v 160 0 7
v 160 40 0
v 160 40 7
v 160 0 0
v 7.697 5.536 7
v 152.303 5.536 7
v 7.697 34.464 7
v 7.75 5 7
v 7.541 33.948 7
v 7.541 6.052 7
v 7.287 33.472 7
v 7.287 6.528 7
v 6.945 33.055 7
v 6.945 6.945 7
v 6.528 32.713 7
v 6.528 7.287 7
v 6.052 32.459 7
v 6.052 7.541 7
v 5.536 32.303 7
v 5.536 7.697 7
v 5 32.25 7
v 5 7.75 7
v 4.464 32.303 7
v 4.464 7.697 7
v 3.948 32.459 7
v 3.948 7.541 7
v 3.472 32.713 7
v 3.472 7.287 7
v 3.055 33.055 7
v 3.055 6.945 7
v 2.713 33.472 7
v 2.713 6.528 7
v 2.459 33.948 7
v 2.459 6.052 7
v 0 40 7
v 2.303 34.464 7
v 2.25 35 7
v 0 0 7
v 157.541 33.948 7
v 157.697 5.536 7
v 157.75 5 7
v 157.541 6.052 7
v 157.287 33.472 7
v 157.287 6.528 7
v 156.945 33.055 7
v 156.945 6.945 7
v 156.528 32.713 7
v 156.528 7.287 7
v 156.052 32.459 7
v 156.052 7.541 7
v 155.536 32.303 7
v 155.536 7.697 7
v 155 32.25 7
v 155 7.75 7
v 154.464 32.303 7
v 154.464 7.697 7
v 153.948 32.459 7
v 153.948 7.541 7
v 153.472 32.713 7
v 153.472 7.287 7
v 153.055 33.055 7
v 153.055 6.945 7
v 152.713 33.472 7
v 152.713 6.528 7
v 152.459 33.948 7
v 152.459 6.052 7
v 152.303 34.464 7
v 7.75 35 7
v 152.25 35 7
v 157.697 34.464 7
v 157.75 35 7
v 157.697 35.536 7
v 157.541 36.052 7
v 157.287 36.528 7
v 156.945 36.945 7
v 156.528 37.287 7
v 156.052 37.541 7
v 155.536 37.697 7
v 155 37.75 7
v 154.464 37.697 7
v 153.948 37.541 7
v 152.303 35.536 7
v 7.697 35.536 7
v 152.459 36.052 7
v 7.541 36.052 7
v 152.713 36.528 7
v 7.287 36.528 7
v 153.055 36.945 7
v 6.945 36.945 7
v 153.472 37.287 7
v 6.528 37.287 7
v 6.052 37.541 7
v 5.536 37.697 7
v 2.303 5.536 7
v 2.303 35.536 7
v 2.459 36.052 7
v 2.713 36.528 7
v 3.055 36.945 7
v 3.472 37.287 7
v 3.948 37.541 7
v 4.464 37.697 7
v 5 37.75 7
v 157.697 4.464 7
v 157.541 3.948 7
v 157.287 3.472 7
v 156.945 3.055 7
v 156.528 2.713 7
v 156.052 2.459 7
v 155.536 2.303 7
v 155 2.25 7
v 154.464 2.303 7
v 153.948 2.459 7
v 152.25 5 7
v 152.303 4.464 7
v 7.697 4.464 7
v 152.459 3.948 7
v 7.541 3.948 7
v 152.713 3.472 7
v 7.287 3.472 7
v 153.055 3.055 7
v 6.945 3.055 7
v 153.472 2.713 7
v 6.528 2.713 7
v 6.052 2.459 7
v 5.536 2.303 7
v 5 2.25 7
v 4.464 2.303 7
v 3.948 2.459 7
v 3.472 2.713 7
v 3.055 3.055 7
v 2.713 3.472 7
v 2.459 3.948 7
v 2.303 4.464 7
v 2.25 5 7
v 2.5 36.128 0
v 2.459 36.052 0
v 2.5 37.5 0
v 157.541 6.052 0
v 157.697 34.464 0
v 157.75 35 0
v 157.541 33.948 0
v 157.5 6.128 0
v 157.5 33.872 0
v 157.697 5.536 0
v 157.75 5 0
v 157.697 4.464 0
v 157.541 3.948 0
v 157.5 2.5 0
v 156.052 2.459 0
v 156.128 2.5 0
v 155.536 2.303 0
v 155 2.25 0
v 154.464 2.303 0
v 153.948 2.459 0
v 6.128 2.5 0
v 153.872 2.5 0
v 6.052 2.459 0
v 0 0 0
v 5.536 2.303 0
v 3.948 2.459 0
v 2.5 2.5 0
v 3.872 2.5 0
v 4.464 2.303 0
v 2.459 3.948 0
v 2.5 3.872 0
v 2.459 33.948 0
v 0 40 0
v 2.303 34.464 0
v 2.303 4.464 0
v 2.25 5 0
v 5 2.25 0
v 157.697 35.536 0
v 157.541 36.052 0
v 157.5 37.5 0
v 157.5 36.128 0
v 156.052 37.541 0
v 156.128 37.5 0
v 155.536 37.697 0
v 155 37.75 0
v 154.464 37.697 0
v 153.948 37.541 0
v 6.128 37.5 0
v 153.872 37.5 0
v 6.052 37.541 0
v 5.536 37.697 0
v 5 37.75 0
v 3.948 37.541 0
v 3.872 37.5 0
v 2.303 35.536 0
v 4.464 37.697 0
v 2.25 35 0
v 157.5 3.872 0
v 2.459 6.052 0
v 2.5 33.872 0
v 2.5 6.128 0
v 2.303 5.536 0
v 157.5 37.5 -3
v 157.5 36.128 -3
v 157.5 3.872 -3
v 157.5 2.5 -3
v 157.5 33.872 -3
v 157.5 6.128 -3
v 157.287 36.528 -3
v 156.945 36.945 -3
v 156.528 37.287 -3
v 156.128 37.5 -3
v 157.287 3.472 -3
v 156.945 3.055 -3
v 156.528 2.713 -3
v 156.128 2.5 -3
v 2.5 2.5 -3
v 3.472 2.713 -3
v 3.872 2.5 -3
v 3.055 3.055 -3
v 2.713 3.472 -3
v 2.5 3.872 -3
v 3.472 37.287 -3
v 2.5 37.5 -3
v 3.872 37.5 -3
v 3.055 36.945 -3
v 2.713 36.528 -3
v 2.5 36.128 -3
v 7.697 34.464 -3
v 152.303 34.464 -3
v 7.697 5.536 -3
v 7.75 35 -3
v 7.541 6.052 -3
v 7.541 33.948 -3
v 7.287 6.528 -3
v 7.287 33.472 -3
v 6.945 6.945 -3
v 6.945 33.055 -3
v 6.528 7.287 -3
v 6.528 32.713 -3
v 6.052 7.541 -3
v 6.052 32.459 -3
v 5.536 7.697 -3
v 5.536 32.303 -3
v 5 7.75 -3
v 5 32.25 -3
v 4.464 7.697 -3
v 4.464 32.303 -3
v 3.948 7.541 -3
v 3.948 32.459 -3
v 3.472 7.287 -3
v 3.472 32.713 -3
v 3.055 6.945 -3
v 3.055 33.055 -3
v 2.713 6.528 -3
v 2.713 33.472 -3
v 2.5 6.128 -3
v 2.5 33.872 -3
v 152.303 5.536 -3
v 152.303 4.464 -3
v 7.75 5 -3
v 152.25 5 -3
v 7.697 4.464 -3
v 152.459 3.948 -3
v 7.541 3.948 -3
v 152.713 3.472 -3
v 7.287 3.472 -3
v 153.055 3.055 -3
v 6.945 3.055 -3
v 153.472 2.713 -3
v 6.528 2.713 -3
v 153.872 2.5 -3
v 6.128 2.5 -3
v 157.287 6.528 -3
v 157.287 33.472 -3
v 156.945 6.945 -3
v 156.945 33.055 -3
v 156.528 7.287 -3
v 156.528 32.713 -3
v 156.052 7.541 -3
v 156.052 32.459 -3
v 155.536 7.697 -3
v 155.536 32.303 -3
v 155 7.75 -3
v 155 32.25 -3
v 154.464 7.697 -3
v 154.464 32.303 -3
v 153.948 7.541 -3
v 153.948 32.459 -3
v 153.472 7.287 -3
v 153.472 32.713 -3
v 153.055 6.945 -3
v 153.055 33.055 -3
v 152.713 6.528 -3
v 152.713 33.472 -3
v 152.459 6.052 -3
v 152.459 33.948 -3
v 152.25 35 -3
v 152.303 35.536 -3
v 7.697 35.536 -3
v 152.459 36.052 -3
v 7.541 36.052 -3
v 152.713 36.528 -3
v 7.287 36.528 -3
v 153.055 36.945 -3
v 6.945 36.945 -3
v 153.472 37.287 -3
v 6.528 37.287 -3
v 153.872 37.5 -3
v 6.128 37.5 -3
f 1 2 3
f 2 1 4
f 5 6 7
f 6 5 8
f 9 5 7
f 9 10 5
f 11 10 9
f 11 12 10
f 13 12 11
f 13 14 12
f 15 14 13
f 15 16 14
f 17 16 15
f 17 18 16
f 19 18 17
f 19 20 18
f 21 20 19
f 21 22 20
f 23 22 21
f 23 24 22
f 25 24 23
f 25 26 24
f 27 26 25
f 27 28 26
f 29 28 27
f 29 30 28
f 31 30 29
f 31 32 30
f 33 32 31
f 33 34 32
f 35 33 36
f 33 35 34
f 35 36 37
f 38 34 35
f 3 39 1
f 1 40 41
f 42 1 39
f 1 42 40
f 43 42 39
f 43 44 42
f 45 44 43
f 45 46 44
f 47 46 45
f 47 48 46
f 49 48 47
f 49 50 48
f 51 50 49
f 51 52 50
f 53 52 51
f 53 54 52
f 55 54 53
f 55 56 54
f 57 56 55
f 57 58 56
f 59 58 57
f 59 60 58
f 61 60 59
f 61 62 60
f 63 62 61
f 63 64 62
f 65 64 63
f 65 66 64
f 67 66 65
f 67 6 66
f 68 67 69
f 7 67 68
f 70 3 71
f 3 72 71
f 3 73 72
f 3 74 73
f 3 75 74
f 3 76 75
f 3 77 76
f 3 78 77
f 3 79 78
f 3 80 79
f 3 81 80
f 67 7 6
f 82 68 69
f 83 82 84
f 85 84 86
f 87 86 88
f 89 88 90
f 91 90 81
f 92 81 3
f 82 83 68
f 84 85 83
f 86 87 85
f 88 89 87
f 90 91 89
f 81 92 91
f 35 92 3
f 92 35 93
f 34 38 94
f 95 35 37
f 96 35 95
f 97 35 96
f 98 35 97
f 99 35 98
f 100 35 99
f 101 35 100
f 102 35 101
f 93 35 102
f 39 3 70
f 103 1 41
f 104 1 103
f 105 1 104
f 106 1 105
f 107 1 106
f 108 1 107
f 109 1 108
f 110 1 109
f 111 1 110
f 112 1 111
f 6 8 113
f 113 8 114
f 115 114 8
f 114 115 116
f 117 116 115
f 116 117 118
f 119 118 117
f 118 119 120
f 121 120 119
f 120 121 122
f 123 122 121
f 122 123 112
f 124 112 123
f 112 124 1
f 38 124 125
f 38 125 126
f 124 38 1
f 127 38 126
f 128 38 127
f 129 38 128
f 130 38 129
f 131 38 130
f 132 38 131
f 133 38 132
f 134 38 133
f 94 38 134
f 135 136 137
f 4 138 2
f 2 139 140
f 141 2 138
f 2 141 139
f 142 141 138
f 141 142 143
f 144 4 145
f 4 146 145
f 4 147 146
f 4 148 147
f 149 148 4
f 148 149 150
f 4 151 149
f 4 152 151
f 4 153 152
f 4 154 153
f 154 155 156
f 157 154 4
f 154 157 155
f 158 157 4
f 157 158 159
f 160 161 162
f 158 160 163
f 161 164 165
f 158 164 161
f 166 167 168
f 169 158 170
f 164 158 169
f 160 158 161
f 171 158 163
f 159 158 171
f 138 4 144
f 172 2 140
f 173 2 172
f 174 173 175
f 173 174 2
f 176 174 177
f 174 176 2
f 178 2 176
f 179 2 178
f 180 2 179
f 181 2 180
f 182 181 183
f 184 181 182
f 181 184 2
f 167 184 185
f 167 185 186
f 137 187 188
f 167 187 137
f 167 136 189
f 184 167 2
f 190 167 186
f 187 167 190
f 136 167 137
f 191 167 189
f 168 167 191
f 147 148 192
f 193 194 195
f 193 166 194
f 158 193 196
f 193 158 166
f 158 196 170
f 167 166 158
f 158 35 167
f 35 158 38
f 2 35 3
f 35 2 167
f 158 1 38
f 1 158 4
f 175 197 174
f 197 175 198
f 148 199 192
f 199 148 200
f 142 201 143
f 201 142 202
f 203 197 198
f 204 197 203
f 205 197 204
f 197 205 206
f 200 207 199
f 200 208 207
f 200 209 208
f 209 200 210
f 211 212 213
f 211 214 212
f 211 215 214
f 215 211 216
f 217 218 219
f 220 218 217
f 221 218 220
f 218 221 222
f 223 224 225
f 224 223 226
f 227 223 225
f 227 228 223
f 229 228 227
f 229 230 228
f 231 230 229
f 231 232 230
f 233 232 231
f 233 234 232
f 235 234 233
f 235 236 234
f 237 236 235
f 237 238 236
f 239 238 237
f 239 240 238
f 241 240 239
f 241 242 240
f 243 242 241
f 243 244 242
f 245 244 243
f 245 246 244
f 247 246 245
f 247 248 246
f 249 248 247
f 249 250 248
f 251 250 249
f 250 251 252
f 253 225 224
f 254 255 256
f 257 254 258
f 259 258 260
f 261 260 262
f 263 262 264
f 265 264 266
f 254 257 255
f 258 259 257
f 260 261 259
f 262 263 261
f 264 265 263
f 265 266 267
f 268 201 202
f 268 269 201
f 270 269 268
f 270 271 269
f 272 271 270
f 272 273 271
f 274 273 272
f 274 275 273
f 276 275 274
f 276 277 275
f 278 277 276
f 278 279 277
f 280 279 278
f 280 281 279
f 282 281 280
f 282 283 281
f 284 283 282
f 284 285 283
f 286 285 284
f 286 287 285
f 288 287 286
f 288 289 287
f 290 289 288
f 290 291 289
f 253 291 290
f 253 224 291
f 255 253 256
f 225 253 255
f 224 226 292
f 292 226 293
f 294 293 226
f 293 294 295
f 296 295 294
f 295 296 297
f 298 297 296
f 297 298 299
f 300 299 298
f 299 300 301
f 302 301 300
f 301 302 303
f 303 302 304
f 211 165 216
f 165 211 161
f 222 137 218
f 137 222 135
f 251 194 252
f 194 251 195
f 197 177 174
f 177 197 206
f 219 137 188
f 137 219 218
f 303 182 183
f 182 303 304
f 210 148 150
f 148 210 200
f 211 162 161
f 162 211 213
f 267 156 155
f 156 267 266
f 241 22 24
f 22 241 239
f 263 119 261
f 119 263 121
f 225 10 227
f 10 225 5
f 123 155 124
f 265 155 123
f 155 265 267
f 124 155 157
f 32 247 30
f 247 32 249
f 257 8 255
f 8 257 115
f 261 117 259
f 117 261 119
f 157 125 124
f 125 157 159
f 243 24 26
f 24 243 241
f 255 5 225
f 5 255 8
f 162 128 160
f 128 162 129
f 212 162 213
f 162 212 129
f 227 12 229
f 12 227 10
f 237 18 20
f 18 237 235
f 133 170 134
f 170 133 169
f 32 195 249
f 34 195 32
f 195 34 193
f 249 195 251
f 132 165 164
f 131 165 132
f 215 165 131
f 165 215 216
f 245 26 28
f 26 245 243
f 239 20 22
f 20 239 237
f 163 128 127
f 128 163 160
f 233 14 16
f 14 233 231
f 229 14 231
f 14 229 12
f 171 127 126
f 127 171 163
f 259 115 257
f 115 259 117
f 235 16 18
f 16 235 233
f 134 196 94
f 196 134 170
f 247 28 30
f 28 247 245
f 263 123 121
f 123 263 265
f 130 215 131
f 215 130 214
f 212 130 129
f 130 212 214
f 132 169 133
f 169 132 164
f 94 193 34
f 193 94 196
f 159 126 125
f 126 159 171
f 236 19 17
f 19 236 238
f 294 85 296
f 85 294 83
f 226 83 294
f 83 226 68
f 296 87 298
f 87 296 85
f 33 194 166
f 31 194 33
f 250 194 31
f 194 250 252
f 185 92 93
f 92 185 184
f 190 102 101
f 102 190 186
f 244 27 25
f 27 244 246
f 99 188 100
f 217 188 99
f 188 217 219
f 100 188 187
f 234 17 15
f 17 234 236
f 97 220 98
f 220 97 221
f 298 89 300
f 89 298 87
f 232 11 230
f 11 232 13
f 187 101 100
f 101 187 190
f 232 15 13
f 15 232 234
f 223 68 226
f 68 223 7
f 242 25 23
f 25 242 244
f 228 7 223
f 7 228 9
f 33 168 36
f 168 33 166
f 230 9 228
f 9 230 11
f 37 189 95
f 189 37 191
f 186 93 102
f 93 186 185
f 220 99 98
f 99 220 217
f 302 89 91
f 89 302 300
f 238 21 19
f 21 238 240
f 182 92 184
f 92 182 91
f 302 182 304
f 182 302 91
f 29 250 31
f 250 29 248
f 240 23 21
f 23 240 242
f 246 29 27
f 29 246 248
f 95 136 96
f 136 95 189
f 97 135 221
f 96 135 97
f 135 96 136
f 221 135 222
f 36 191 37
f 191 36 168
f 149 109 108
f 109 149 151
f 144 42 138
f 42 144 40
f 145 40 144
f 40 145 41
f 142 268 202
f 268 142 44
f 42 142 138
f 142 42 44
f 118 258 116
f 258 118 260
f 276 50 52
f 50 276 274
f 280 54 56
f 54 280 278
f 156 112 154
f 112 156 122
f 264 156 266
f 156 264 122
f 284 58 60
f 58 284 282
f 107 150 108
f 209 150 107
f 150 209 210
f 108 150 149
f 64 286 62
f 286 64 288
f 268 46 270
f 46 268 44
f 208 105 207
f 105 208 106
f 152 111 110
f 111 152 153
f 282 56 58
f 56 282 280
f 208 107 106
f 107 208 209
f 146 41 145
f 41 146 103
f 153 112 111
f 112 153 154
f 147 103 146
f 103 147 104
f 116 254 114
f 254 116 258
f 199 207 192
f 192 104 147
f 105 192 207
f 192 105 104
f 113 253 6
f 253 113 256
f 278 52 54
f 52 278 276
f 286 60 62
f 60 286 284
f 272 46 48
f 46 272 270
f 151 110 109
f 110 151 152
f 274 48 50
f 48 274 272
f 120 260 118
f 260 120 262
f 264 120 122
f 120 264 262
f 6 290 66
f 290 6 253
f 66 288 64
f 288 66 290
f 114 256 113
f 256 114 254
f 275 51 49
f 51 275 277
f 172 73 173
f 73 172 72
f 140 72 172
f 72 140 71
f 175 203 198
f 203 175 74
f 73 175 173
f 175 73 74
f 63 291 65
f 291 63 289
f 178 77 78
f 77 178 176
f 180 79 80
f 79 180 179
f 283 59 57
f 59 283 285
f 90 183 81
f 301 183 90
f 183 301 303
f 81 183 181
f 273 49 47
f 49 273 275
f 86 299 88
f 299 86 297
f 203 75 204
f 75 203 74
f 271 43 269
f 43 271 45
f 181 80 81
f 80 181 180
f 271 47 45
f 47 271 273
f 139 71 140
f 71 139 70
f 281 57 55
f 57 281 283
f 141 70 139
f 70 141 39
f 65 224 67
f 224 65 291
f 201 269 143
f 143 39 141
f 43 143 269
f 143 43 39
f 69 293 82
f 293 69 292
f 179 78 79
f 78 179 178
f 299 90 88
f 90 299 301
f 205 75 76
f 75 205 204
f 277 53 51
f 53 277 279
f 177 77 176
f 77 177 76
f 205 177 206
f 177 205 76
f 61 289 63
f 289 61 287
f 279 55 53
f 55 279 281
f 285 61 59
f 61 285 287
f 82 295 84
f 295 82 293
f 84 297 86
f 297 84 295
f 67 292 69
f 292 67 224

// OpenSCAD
$fn = 32;

// ----------------------------------------------------------------------
// Enclosure lid: 160 x 40 x 7 mm, 4 bolt holes
// ----------------------------------------------------------------------

// --- parameters (mm) ---
length = 160;             // lid length, X
width = 40;               // lid width, Y
plate_t = 7;              // lid plate thickness
bolt_d = 5.5;             // bolt clearance
boss_lip = 5;             // bolt hole inset from the corner
sink = 1;                 // overlap of the lip and ribs into the plate
lip_h = 4;                // lip height below the plate
lip_wall = 2.5;           // lip wall thickness

module plate() {
  cube([length, width, plate_t]);
  /* lip that drops into the housing opening, sunk into the plate */
  translate([lip_wall, lip_wall, -lip_h + sink]) cube([length - 2 * lip_wall, width - 2 * lip_wall, lip_h]);
}

difference() {
  plate();
  /* bolt pattern matching the corner bosses */
  for (sx = [0, 1]) for (sy = [0, 1])
    translate([sx * (length - 2 * boss_lip) + boss_lip, sy * (width - 2 * boss_lip) + boss_lip, -lip_h - 1])
      cylinder(h = plate_t + lip_h + 2, d = bolt_d);
}
